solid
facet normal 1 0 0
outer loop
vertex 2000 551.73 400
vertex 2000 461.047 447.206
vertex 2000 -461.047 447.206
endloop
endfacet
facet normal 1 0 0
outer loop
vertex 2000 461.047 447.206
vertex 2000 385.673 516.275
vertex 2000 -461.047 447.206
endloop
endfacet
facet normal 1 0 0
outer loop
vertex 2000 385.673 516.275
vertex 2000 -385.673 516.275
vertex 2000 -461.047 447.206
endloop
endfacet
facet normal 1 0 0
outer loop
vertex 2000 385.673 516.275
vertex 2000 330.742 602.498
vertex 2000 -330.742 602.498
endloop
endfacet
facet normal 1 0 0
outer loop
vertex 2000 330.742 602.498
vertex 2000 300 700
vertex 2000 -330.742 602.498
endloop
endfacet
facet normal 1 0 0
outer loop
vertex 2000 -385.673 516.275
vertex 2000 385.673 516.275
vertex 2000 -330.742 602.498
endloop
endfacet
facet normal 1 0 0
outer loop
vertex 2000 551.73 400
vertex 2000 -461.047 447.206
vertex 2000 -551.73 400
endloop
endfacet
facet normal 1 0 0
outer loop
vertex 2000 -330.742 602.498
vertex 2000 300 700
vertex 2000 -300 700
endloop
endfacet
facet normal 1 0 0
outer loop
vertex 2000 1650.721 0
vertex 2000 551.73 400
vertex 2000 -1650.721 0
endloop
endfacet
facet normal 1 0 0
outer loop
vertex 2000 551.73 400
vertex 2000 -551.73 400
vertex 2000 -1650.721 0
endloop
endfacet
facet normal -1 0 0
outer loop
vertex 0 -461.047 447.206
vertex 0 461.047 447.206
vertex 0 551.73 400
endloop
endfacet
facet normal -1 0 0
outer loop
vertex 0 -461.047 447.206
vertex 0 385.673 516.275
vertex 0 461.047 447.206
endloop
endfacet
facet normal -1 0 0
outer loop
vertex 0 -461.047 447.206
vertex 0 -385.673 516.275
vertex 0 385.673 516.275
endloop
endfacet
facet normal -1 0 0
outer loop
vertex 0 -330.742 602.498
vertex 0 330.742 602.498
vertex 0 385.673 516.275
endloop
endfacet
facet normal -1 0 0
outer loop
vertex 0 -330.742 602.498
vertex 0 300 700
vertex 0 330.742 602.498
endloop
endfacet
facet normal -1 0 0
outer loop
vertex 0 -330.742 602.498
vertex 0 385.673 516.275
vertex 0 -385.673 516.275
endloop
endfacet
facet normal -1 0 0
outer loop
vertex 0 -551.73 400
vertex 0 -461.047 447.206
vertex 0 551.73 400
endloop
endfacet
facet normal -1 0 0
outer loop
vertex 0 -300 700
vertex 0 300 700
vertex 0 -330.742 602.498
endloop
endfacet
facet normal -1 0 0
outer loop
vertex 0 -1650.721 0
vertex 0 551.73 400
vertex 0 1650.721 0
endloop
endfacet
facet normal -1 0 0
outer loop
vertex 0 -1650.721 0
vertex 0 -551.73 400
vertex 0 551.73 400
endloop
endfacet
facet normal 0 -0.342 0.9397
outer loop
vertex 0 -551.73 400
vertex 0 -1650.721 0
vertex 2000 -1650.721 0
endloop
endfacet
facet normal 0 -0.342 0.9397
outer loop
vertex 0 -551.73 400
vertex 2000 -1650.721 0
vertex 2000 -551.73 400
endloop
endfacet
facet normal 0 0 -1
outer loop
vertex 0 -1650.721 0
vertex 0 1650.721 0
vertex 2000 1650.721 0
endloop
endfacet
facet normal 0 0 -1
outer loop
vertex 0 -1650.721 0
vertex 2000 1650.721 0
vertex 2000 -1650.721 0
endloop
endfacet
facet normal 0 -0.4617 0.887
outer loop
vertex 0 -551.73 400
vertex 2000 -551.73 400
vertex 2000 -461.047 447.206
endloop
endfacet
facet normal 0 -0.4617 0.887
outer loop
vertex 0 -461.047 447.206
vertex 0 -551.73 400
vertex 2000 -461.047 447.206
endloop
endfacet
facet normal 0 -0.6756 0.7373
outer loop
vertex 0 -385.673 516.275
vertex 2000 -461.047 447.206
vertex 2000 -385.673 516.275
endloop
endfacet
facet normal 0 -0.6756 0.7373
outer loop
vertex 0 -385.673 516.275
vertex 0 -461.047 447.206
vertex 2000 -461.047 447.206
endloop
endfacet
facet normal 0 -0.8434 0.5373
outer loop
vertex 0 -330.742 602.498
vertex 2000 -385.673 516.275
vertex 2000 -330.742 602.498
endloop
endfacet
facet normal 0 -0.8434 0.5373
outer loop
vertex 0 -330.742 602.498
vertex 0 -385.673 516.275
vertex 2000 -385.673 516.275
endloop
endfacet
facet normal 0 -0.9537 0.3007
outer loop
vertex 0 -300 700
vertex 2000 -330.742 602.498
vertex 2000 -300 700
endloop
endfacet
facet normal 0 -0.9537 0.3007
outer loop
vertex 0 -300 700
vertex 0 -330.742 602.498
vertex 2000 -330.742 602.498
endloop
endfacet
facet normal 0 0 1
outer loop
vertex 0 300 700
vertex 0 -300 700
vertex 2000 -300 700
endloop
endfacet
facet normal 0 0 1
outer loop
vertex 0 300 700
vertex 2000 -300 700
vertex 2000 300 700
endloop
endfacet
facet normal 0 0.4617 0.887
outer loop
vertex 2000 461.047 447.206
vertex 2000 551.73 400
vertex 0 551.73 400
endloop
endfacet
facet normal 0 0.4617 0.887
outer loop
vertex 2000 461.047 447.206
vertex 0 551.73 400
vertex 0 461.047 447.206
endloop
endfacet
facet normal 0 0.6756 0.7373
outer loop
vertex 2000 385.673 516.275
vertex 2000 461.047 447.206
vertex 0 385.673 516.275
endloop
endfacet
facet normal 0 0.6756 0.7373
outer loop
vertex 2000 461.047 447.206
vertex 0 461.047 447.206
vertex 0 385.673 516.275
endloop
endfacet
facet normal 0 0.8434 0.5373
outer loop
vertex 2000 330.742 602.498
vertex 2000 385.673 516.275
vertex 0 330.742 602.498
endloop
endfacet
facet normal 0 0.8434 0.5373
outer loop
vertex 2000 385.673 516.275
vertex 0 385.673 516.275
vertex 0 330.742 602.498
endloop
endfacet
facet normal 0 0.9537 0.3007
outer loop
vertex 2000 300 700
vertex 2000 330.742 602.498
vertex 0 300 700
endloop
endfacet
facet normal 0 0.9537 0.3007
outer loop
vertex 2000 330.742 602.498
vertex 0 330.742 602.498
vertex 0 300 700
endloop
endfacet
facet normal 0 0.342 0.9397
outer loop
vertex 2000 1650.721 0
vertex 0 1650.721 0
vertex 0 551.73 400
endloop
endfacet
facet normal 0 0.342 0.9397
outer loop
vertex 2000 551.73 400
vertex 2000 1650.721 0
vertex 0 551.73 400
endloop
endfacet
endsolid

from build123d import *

# Parameters (mm, degrees)
F1_DEPTH = 2000


with BuildPart() as f1:
    # F0 (on Right) → F1 (new body)
    with BuildSketch(Plane.YZ):
        with BuildLine():
            Line((0, 700), (0, 0))
            Line((0, 0), (1650.720857, 0))
            Line((1650.720857, 0), (551.729889, 400))
            ThreePointArc((551.729889, 400), (385.672566, 516.27459), (300, 700))
            Line((300, 700), (0, 700))
        make_face()
    extrude(amount=F1_DEPTH)

    # F2: F1 across face


with BuildPart() as f1_1:
    add(f1.part)
    add(f1.part.mirror(Plane(origin=(1000, 0, 350), x_dir=(1, 0, 0), z_dir=(0, -1, 0))))


solid = f1_1.part
